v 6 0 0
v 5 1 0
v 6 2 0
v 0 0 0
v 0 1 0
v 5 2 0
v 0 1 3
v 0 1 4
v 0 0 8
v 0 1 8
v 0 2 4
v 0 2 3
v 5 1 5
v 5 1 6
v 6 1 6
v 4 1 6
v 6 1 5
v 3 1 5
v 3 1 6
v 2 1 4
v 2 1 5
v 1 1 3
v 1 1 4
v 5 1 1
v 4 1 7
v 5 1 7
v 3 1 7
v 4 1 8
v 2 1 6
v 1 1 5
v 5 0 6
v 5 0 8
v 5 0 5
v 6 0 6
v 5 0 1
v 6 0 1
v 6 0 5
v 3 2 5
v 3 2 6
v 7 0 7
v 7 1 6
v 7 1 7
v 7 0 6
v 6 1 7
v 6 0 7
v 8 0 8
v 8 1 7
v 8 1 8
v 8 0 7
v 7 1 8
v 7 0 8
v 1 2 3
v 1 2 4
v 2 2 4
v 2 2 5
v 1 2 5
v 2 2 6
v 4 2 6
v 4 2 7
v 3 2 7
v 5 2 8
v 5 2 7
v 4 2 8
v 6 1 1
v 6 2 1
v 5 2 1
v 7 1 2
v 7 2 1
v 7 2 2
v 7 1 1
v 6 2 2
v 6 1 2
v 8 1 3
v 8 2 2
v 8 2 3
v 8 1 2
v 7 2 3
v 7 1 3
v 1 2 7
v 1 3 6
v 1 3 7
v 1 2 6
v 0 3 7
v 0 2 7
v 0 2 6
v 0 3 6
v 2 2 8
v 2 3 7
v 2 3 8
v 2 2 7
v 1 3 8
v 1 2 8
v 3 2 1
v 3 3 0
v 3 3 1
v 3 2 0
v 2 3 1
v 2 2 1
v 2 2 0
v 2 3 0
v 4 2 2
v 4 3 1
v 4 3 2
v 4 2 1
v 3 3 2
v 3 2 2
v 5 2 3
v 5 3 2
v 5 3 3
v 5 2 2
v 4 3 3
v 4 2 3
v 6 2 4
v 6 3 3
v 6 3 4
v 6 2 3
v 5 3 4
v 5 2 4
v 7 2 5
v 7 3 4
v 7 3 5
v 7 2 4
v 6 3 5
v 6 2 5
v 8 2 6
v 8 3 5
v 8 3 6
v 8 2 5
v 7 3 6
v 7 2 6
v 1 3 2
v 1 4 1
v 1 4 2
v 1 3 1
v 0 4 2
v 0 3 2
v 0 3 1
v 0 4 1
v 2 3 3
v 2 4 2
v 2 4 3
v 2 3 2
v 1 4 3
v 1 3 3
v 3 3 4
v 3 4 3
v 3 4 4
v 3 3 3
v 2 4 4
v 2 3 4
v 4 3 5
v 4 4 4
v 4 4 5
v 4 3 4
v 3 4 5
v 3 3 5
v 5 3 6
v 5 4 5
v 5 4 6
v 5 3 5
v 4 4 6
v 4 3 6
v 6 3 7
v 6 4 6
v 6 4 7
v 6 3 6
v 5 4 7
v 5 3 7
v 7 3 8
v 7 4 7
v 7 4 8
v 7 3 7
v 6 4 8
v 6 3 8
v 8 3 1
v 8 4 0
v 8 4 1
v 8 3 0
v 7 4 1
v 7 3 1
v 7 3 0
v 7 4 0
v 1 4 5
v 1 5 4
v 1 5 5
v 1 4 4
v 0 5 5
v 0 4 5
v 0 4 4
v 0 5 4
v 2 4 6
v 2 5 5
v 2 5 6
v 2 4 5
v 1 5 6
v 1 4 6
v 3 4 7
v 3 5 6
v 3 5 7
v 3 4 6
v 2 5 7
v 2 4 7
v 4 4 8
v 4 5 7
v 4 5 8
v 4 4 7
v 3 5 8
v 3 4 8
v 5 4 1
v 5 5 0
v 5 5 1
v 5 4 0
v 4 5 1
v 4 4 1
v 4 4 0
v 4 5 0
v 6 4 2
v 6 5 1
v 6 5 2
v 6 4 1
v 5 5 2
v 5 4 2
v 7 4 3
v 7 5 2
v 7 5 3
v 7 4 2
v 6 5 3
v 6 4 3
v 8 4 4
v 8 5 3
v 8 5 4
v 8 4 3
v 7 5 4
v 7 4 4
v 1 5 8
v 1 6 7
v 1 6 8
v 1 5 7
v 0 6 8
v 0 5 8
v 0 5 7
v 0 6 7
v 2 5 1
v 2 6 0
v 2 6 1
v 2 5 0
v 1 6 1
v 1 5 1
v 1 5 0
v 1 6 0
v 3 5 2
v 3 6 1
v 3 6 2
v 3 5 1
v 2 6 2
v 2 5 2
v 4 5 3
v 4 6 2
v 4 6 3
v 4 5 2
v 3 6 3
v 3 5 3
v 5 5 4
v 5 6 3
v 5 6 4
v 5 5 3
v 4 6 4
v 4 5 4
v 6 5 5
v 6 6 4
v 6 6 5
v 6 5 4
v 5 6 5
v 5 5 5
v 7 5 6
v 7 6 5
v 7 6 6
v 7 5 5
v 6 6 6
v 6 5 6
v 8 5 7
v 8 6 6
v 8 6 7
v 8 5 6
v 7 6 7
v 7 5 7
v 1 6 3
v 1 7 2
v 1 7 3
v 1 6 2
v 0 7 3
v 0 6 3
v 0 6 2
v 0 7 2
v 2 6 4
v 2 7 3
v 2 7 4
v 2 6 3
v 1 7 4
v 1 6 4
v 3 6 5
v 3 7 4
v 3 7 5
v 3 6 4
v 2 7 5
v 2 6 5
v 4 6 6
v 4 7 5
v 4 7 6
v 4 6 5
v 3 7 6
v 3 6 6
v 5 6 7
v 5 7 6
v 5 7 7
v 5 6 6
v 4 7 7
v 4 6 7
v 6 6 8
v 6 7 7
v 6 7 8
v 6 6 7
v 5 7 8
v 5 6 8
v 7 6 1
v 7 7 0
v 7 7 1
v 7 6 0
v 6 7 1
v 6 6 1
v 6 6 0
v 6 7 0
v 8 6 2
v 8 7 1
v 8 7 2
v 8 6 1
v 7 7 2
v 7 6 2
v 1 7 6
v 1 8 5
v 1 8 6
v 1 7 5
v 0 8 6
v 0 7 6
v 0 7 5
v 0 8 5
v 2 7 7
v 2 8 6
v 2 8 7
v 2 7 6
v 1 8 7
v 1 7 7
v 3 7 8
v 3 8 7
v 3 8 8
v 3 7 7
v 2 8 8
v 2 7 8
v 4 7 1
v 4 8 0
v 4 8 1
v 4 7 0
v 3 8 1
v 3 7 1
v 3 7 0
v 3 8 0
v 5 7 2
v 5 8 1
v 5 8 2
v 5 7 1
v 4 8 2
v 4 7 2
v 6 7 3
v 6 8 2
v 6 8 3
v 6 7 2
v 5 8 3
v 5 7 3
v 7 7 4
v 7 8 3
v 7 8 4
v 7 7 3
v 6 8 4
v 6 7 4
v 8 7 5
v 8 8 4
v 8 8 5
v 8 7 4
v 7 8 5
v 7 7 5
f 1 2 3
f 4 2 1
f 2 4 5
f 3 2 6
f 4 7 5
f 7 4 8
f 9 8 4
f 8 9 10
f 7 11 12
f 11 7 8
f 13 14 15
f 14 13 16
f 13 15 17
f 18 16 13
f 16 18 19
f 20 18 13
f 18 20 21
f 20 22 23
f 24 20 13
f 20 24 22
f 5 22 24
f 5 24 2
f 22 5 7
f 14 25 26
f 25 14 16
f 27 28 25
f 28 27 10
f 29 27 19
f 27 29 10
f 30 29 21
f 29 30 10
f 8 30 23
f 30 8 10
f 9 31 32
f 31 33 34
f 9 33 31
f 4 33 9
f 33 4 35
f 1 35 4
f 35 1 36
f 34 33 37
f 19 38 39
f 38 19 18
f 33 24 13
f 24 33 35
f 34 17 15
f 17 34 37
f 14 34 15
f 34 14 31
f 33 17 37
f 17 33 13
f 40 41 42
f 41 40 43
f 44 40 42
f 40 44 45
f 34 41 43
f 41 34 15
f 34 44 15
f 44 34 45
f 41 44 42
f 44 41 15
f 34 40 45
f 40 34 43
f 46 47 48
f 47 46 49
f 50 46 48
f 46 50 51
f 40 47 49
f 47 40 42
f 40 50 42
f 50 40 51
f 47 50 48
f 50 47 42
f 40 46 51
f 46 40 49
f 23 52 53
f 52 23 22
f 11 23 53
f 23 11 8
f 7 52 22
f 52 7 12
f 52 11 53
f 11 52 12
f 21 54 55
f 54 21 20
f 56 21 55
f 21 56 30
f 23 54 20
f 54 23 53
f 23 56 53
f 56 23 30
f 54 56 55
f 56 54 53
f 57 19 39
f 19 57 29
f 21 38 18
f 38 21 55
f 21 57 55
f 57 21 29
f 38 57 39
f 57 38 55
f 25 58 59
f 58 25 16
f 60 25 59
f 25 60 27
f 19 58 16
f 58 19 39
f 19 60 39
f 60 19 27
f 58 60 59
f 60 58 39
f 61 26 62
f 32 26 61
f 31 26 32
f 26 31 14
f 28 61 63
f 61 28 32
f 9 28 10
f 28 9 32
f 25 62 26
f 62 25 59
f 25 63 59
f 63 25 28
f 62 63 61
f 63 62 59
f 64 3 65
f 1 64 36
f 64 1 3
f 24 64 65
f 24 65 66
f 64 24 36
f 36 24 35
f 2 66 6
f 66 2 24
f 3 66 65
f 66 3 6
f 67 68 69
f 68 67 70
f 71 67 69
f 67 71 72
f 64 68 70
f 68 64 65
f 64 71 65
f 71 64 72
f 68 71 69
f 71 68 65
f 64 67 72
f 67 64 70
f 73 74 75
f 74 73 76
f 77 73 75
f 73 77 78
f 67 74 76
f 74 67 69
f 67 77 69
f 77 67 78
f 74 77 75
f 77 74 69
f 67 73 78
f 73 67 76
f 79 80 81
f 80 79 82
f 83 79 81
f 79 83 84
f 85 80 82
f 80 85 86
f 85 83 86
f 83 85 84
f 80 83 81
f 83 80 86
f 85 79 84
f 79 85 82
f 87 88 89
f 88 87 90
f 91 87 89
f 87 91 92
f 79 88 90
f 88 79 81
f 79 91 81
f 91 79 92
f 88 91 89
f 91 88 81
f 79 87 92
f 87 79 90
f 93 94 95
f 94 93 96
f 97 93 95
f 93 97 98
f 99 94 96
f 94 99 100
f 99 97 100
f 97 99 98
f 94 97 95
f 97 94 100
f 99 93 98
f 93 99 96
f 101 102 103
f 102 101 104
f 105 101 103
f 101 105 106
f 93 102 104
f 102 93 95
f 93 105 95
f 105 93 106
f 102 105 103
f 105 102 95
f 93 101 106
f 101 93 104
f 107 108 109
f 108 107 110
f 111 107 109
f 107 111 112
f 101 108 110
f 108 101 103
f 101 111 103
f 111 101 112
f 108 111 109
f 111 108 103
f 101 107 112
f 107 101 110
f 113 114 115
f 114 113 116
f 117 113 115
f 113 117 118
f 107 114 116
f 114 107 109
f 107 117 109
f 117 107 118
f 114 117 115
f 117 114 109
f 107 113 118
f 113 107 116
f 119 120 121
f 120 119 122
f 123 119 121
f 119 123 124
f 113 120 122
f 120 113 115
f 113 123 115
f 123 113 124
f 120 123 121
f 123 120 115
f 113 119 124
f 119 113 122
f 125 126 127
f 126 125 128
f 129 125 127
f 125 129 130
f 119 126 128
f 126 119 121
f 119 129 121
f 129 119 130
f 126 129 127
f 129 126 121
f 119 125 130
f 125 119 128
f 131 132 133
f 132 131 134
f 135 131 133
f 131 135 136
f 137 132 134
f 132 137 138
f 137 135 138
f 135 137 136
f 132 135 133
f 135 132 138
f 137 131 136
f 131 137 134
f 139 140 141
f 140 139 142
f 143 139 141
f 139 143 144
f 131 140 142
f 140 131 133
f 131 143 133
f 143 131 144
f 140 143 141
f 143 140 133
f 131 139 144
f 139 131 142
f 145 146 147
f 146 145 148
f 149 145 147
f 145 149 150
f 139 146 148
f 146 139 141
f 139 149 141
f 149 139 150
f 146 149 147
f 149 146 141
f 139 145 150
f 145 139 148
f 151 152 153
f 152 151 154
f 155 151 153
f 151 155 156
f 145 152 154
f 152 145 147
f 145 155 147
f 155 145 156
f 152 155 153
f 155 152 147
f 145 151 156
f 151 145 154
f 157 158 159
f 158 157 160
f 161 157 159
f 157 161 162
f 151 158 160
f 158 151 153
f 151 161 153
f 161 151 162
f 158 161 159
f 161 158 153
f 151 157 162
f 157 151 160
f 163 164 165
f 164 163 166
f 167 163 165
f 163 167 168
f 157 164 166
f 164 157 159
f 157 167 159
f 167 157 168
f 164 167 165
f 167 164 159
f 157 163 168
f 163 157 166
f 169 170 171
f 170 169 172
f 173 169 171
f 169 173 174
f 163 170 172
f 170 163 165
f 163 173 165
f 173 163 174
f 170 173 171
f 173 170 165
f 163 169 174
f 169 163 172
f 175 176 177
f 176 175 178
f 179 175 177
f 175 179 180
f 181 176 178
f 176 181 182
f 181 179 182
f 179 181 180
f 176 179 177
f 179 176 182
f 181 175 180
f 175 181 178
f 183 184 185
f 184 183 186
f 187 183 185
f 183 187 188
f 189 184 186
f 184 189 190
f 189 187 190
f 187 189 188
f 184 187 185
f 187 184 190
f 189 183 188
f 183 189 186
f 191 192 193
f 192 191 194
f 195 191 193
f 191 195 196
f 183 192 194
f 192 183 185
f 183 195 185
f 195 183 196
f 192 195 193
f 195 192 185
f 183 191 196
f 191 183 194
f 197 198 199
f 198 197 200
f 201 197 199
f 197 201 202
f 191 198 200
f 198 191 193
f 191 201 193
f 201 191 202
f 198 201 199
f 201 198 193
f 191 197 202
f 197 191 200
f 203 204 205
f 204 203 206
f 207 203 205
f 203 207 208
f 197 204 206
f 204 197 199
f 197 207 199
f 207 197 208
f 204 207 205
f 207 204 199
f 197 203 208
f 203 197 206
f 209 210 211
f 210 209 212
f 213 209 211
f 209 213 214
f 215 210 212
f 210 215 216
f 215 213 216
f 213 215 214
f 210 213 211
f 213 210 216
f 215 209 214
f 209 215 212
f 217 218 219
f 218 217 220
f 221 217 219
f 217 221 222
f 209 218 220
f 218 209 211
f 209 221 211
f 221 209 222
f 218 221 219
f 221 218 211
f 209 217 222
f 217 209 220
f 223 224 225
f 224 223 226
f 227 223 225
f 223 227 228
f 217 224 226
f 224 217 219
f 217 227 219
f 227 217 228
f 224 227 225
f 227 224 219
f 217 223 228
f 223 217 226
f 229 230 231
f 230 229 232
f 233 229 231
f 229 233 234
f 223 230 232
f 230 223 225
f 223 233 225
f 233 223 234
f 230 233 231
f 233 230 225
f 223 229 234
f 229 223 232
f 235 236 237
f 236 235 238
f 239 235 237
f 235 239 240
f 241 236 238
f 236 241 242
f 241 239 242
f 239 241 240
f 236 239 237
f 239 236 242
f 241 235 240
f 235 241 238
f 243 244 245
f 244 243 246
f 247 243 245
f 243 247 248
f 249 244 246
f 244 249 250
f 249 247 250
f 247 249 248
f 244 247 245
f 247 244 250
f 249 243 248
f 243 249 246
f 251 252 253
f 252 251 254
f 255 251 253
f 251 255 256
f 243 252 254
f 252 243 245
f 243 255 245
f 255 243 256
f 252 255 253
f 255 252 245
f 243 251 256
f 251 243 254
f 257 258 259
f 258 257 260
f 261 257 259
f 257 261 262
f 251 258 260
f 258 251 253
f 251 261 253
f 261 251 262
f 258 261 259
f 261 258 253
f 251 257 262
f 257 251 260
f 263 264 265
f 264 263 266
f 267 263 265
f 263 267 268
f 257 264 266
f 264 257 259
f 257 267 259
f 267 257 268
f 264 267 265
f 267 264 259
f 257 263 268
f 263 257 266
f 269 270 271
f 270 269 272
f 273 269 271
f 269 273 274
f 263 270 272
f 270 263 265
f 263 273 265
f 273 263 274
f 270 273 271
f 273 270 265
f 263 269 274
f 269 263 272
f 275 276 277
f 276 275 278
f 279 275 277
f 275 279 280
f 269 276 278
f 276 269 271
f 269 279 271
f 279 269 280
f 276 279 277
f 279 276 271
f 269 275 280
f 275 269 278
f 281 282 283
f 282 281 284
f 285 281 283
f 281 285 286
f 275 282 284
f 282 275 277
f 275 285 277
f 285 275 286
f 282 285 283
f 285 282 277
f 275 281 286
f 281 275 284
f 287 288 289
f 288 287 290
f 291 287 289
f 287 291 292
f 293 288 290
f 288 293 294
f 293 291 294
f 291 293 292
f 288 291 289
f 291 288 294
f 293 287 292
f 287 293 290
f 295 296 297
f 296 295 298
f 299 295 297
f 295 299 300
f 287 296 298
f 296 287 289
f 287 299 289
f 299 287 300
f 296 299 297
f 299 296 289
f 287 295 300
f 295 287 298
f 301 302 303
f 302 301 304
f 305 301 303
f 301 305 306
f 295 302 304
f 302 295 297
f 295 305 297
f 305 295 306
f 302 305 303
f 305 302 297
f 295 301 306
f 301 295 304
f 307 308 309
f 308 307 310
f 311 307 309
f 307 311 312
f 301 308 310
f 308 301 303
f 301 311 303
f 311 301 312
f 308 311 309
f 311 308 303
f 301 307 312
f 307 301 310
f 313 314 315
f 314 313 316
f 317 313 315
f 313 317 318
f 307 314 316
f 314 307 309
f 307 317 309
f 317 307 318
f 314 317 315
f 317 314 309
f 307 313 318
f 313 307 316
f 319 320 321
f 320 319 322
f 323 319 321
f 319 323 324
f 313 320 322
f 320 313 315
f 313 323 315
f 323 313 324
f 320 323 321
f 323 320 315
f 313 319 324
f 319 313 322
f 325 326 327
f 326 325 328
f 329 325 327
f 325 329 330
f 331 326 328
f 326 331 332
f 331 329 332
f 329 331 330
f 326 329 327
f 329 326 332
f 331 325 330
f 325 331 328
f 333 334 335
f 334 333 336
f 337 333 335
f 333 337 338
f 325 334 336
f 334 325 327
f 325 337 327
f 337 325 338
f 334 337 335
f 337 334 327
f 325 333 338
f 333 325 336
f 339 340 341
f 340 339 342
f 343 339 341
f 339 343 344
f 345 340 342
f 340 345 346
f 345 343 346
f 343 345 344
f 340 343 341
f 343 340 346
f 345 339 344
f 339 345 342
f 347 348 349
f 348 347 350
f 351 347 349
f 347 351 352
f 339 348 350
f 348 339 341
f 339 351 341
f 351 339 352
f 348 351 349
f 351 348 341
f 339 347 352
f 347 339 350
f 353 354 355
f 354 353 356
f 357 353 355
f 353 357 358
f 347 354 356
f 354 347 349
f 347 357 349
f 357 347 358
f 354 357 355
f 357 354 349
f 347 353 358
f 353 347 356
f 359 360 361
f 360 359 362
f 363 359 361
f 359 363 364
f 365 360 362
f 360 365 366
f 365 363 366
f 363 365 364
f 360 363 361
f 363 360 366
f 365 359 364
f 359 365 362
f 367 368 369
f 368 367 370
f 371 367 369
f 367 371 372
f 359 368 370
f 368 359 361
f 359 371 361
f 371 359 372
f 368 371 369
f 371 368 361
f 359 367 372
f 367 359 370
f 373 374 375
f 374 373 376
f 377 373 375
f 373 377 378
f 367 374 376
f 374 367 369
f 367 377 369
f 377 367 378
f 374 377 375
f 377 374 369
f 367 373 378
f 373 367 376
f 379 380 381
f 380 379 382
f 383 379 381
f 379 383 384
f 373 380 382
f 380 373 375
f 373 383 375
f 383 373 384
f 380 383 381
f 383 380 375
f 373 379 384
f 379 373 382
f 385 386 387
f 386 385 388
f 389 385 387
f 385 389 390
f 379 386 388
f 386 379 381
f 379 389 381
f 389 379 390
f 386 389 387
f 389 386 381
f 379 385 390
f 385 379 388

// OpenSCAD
union() {
    translate([0, 0, 0]) cube([1, 1, 1]);
    translate([1, 0, 1]) cube([1, 1, 1]);
    translate([2, 0, 2]) cube([1, 1, 1]);
    translate([3, 0, 3]) cube([1, 1, 1]);
    translate([4, 0, 4]) cube([1, 1, 1]);
    translate([5, 0, 5]) cube([1, 1, 1]);
    translate([6, 0, 6]) cube([1, 1, 1]);
    translate([7, 0, 7]) cube([1, 1, 1]);
    translate([0, 1, 3]) cube([1, 1, 1]);
    translate([1, 1, 4]) cube([1, 1, 1]);
    translate([2, 1, 5]) cube([1, 1, 1]);
    translate([3, 1, 6]) cube([1, 1, 1]);
    translate([4, 1, 7]) cube([1, 1, 1]);
    translate([5, 1, 0]) cube([1, 1, 1]);
    translate([6, 1, 1]) cube([1, 1, 1]);
    translate([7, 1, 2]) cube([1, 1, 1]);
    translate([0, 2, 6]) cube([1, 1, 1]);
    translate([1, 2, 7]) cube([1, 1, 1]);
    translate([2, 2, 0]) cube([1, 1, 1]);
    translate([3, 2, 1]) cube([1, 1, 1]);
    translate([4, 2, 2]) cube([1, 1, 1]);
    translate([5, 2, 3]) cube([1, 1, 1]);
    translate([6, 2, 4]) cube([1, 1, 1]);
    translate([7, 2, 5]) cube([1, 1, 1]);
    translate([0, 3, 1]) cube([1, 1, 1]);
    translate([1, 3, 2]) cube([1, 1, 1]);
    translate([2, 3, 3]) cube([1, 1, 1]);
    translate([3, 3, 4]) cube([1, 1, 1]);
    translate([4, 3, 5]) cube([1, 1, 1]);
    translate([5, 3, 6]) cube([1, 1, 1]);
    translate([6, 3, 7]) cube([1, 1, 1]);
    translate([7, 3, 0]) cube([1, 1, 1]);
    translate([0, 4, 4]) cube([1, 1, 1]);
    translate([1, 4, 5]) cube([1, 1, 1]);
    translate([2, 4, 6]) cube([1, 1, 1]);
    translate([3, 4, 7]) cube([1, 1, 1]);
    translate([4, 4, 0]) cube([1, 1, 1]);
    translate([5, 4, 1]) cube([1, 1, 1]);
    translate([6, 4, 2]) cube([1, 1, 1]);
    translate([7, 4, 3]) cube([1, 1, 1]);
    translate([0, 5, 7]) cube([1, 1, 1]);
    translate([1, 5, 0]) cube([1, 1, 1]);
    translate([2, 5, 1]) cube([1, 1, 1]);
    translate([3, 5, 2]) cube([1, 1, 1]);
    translate([4, 5, 3]) cube([1, 1, 1]);
    translate([5, 5, 4]) cube([1, 1, 1]);
    translate([6, 5, 5]) cube([1, 1, 1]);
    translate([7, 5, 6]) cube([1, 1, 1]);
    translate([0, 6, 2]) cube([1, 1, 1]);
    translate([1, 6, 3]) cube([1, 1, 1]);
    translate([2, 6, 4]) cube([1, 1, 1]);
    translate([3, 6, 5]) cube([1, 1, 1]);
    translate([4, 6, 6]) cube([1, 1, 1]);
    translate([5, 6, 7]) cube([1, 1, 1]);
    translate([6, 6, 0]) cube([1, 1, 1]);
    translate([7, 6, 1]) cube([1, 1, 1]);
    translate([0, 7, 5]) cube([1, 1, 1]);
    translate([1, 7, 6]) cube([1, 1, 1]);
    translate([2, 7, 7]) cube([1, 1, 1]);
    translate([3, 7, 0]) cube([1, 1, 1]);
    translate([4, 7, 1]) cube([1, 1, 1]);
    translate([5, 7, 2]) cube([1, 1, 1]);
    translate([6, 7, 3]) cube([1, 1, 1]);
    translate([7, 7, 4]) cube([1, 1, 1]);
    translate([0, 0, 1]) cube([1, 1, 1]);
    translate([0, 0, 2]) cube([1, 1, 1]);
    translate([0, 0, 3]) cube([1, 1, 1]);
    translate([0, 0, 4]) cube([1, 1, 1]);
    translate([0, 0, 5]) cube([1, 1, 1]);
    translate([0, 0, 6]) cube([1, 1, 1]);
    translate([0, 0, 7]) cube([1, 1, 1]);
    translate([1, 0, 0]) cube([1, 1, 1]);
    translate([1, 0, 2]) cube([1, 1, 1]);
    translate([1, 0, 3]) cube([1, 1, 1]);
    translate([1, 0, 4]) cube([1, 1, 1]);
    translate([1, 0, 5]) cube([1, 1, 1]);
    translate([1, 0, 6]) cube([1, 1, 1]);
    translate([1, 0, 7]) cube([1, 1, 1]);
    translate([2, 0, 0]) cube([1, 1, 1]);
    translate([2, 0, 1]) cube([1, 1, 1]);
    translate([2, 0, 3]) cube([1, 1, 1]);
    translate([2, 0, 4]) cube([1, 1, 1]);
    translate([2, 0, 5]) cube([1, 1, 1]);
    translate([2, 0, 6]) cube([1, 1, 1]);
    translate([2, 0, 7]) cube([1, 1, 1]);
    translate([3, 0, 0]) cube([1, 1, 1]);
    translate([3, 0, 1]) cube([1, 1, 1]);
    translate([3, 0, 2]) cube([1, 1, 1]);
    translate([3, 0, 4]) cube([1, 1, 1]);
    translate([3, 0, 5]) cube([1, 1, 1]);
    translate([3, 0, 6]) cube([1, 1, 1]);
    translate([3, 0, 7]) cube([1, 1, 1]);
    translate([4, 0, 0]) cube([1, 1, 1]);
    translate([4, 0, 1]) cube([1, 1, 1]);
    translate([4, 0, 2]) cube([1, 1, 1]);
    translate([4, 0, 3]) cube([1, 1, 1]);
    translate([4, 0, 5]) cube([1, 1, 1]);
    translate([4, 0, 6]) cube([1, 1, 1]);
    translate([4, 0, 7]) cube([1, 1, 1]);
    translate([5, 0, 0]) cube([1, 1, 1]);
}
